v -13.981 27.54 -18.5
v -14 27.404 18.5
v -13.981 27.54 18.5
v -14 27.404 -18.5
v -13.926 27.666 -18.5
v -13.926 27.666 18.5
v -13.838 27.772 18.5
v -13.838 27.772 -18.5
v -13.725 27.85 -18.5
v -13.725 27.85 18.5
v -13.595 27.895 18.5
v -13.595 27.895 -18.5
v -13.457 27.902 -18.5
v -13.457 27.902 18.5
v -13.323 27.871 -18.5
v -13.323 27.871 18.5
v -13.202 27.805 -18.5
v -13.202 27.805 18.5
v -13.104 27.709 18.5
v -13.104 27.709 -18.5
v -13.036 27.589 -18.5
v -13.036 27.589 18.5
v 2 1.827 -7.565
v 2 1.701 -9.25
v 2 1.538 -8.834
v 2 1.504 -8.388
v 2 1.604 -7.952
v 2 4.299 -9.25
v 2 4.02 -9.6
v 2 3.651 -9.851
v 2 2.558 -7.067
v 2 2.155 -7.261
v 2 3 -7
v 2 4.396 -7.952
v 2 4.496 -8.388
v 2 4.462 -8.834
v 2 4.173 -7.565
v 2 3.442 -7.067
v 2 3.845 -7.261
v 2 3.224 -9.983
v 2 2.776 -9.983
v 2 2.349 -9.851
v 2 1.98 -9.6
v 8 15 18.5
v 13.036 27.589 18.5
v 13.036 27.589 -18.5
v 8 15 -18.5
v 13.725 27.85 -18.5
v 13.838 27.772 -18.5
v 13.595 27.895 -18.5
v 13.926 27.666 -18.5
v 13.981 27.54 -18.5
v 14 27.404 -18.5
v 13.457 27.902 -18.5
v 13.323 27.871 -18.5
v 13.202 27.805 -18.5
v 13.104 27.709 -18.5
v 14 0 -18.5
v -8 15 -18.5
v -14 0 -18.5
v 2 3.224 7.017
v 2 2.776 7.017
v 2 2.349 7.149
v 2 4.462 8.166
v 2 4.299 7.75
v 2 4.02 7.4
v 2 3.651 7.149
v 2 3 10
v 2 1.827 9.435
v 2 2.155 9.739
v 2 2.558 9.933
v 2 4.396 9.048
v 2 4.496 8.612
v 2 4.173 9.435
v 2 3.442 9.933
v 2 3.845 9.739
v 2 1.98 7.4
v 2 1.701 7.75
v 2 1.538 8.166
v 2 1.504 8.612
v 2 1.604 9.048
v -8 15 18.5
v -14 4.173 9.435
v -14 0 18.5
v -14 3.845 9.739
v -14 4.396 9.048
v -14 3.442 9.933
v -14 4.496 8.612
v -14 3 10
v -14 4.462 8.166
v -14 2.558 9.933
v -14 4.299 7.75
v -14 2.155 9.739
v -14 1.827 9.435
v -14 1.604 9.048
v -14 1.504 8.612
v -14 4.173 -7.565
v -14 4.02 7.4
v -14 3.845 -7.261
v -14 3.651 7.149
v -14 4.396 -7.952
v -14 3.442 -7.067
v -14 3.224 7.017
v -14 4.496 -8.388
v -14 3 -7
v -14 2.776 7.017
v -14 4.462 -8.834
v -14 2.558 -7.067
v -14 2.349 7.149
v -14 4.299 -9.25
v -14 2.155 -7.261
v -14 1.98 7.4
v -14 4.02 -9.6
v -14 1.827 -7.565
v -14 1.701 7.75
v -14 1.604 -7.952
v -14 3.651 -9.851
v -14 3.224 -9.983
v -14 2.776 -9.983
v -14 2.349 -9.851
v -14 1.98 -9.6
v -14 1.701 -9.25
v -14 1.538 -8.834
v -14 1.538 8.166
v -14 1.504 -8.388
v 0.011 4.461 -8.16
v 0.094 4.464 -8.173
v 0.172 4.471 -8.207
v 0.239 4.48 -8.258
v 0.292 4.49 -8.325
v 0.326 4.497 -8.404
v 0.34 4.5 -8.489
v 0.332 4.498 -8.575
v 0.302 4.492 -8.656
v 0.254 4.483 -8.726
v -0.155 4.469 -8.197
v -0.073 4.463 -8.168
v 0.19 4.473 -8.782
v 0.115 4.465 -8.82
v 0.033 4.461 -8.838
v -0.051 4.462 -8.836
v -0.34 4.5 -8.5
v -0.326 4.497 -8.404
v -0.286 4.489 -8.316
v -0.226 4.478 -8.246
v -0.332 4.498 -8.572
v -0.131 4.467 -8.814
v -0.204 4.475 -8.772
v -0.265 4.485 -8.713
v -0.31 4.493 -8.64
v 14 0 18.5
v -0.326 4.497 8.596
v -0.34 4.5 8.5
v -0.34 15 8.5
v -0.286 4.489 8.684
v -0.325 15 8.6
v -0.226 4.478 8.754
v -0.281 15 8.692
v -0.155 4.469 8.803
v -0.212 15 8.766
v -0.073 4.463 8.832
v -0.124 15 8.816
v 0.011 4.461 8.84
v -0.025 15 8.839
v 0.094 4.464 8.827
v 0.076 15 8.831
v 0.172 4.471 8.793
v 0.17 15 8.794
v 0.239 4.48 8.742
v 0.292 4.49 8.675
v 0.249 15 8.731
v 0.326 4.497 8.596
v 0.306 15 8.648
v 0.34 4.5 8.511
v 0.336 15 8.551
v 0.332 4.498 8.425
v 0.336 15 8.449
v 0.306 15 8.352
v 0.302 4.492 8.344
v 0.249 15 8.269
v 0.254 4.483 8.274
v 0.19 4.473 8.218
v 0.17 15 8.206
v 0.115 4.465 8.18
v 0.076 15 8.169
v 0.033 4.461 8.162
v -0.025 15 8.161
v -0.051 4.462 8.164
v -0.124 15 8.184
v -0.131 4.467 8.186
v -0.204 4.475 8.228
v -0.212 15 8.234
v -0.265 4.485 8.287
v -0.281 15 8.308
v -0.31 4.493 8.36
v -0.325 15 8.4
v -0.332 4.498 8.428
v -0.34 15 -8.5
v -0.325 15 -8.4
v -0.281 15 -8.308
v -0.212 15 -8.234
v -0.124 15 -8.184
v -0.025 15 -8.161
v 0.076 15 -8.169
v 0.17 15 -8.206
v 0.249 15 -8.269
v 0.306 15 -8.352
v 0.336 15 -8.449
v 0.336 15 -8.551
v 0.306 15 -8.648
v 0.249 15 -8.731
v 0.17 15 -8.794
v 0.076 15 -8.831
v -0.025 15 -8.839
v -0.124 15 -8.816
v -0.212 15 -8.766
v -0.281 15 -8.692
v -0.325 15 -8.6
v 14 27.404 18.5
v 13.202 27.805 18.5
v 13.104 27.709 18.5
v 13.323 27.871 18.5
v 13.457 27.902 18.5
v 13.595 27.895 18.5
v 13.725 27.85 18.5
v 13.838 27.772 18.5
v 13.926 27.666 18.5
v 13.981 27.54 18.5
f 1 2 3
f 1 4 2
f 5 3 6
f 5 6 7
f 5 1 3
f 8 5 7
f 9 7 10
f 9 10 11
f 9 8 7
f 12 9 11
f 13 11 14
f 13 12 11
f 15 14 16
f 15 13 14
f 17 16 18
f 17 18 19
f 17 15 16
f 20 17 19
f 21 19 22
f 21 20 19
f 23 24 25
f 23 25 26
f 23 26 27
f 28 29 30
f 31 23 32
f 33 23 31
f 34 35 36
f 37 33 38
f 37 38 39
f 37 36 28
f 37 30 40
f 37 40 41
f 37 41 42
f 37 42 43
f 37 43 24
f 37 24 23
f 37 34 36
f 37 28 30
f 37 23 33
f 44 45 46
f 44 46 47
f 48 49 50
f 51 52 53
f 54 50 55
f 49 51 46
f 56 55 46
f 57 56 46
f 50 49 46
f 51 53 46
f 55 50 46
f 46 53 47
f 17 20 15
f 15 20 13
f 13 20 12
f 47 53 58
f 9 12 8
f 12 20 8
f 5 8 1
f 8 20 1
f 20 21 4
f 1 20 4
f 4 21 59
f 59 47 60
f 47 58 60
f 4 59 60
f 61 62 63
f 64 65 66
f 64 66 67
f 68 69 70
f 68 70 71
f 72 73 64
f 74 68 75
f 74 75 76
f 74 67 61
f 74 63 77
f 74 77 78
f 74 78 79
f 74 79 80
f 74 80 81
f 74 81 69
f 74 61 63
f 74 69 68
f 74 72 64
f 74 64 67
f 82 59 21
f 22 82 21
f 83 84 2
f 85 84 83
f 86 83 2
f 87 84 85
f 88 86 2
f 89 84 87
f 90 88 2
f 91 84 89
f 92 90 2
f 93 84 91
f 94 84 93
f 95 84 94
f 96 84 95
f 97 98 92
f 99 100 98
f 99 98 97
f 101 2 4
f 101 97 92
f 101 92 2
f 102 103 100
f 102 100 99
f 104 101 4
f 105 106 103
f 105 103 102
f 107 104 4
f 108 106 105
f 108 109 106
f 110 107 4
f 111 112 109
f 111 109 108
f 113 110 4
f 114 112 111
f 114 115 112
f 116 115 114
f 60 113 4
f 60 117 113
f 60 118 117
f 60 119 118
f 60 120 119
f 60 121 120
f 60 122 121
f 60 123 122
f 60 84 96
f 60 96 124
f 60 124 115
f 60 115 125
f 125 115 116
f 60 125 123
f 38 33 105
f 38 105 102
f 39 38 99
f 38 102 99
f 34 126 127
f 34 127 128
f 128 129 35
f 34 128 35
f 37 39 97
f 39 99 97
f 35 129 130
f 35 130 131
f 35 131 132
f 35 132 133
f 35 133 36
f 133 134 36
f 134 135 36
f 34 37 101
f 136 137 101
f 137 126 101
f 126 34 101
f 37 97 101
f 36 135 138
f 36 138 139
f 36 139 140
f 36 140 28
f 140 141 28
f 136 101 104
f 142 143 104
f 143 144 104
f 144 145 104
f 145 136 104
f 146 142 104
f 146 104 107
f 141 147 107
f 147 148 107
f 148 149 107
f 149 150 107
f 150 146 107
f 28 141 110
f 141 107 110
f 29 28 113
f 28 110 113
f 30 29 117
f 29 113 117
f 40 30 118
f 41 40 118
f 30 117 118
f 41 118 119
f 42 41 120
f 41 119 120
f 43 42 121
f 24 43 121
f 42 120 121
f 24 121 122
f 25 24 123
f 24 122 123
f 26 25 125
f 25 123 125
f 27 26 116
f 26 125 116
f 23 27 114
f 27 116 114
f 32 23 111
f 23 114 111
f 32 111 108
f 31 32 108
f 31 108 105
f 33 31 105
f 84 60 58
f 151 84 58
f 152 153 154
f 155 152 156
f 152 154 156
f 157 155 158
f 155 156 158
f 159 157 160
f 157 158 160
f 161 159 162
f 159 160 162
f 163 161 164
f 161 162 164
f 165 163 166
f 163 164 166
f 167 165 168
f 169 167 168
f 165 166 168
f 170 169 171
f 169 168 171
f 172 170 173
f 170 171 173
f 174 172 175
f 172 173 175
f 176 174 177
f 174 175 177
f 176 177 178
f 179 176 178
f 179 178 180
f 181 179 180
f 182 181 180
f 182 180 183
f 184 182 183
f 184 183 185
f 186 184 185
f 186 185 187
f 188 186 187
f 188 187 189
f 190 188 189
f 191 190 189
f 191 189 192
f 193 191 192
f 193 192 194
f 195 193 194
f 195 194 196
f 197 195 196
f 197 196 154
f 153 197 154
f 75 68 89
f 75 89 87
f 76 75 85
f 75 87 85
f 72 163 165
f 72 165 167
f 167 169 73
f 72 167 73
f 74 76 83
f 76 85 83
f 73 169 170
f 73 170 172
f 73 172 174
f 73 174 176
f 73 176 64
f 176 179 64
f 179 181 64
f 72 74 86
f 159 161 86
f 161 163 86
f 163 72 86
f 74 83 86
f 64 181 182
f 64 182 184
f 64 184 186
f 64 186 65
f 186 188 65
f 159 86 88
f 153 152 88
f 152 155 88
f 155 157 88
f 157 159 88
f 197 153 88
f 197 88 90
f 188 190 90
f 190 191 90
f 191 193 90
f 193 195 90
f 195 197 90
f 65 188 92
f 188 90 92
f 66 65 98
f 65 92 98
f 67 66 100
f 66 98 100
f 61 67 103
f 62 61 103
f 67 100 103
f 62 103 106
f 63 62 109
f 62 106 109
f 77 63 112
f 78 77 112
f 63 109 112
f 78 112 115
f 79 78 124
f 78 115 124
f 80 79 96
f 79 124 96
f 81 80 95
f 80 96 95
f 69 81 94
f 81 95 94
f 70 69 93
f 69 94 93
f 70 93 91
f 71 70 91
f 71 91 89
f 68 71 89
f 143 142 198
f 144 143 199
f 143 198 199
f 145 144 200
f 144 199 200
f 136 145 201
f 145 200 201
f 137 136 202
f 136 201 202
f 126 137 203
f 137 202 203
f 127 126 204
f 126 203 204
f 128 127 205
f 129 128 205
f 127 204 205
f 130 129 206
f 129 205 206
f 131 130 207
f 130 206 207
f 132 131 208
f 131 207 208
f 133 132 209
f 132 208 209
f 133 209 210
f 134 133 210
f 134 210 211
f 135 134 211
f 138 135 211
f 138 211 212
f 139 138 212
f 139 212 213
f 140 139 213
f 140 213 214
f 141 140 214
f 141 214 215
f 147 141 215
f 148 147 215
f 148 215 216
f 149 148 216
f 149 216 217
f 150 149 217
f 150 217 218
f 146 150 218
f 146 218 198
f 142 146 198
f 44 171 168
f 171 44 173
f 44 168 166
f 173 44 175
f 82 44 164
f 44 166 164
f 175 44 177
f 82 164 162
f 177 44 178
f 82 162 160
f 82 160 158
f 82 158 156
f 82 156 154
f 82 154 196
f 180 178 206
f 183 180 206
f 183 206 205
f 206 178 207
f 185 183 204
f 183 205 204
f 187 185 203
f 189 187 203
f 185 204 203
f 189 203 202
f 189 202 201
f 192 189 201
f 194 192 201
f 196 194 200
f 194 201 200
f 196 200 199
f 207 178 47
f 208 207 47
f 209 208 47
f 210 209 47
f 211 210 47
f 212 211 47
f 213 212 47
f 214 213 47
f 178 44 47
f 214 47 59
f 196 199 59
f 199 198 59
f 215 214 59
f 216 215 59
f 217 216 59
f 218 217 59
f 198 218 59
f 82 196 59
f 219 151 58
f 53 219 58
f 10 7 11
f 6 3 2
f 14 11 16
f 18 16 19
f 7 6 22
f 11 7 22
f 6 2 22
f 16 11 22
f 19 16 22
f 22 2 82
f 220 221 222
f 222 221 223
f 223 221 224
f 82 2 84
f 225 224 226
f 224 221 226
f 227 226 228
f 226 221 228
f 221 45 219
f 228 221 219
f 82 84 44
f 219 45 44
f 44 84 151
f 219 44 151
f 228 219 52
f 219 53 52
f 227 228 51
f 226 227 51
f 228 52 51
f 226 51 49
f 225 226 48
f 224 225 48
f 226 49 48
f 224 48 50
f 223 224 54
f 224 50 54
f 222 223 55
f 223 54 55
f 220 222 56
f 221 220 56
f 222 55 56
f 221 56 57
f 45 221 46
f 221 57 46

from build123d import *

# Parameters (mm, degrees)
ESQUISSE1_W             = 2
ESQUISSE1_H             = 37
ESQUISSE1_W_2           = 24
BOSS_EXTRU_1_DEPTH      = 30
ENL_V_MAT_EXTRU_3_DEPTH = 40
CONG_1_R                = 0.5
ESQUISSE4_R             = 0.34
ENL_V_MAT_EXTRU_4_DEPTH = 12
ESQUISSE5_R             = 1.5
ENL_V_MAT_EXTRU_6_DEPTH = 16


with BuildPart() as part:
    # Esquisse1 → Boss.-Extru.1 (new body)
    with BuildSketch(Plane(origin=(0, 0, 0), x_dir=(1, 0, 0), z_dir=(0, 1, 0))):
        with Locations((-13, 0)):
            Rectangle(ESQUISSE1_W, ESQUISSE1_H)
        Rectangle(ESQUISSE1_W_2, ESQUISSE1_H)
        with Locations((13, 0)):
            Rectangle(ESQUISSE1_W, ESQUISSE1_H)
    extrude(amount=BOSS_EXTRU_1_DEPTH)

    # Esquisse3 → Enlèv. mat.-Extru.3 (cut)
    with BuildSketch(Plane(origin=(0, 0, -18.5), x_dir=(-1, 0, 0), z_dir=(0, 0, -1))):
        Polygon((-8, 15), (8, 15), (14, 30), (-14, 30), align=None)
    extrude(amount=-ENL_V_MAT_EXTRU_3_DEPTH, mode=Mode.SUBTRACT)

    # Congé1
    cong_1_edges = [part.edges().sort_by_distance(p)[0] for p in [
        (14, 30, 0),
        (-14, 30, 0),
    ]]
    fillet(cong_1_edges, radius=CONG_1_R)

    # Esquisse4 → Enlèv. mat.-Extru.4 (cut)
    with BuildSketch(Plane(origin=(0, 15, 0), x_dir=(1, 0, 0), z_dir=(0, 1, 0))):
        with Locations(Location((0, 8.5, 0), (0, 0, 180))):
            Circle(ESQUISSE4_R)
        with Locations(Location((0, -8.5, 0), (0, 0, 180))):
            Circle(ESQUISSE4_R)
    extrude(amount=-ENL_V_MAT_EXTRU_4_DEPTH, mode=Mode.SUBTRACT)

    # Esquisse5 → Enlèv. mat.-Extru.6 (cut)
    with BuildSketch(Plane.ZY.offset(14)):
        with Locations((-8.5, 3)):
            Circle(ESQUISSE5_R)
        with Locations((8.5, 3)):
            Circle(ESQUISSE5_R)
    extrude(amount=-ENL_V_MAT_EXTRU_6_DEPTH, mode=Mode.SUBTRACT)


solid = part.part
